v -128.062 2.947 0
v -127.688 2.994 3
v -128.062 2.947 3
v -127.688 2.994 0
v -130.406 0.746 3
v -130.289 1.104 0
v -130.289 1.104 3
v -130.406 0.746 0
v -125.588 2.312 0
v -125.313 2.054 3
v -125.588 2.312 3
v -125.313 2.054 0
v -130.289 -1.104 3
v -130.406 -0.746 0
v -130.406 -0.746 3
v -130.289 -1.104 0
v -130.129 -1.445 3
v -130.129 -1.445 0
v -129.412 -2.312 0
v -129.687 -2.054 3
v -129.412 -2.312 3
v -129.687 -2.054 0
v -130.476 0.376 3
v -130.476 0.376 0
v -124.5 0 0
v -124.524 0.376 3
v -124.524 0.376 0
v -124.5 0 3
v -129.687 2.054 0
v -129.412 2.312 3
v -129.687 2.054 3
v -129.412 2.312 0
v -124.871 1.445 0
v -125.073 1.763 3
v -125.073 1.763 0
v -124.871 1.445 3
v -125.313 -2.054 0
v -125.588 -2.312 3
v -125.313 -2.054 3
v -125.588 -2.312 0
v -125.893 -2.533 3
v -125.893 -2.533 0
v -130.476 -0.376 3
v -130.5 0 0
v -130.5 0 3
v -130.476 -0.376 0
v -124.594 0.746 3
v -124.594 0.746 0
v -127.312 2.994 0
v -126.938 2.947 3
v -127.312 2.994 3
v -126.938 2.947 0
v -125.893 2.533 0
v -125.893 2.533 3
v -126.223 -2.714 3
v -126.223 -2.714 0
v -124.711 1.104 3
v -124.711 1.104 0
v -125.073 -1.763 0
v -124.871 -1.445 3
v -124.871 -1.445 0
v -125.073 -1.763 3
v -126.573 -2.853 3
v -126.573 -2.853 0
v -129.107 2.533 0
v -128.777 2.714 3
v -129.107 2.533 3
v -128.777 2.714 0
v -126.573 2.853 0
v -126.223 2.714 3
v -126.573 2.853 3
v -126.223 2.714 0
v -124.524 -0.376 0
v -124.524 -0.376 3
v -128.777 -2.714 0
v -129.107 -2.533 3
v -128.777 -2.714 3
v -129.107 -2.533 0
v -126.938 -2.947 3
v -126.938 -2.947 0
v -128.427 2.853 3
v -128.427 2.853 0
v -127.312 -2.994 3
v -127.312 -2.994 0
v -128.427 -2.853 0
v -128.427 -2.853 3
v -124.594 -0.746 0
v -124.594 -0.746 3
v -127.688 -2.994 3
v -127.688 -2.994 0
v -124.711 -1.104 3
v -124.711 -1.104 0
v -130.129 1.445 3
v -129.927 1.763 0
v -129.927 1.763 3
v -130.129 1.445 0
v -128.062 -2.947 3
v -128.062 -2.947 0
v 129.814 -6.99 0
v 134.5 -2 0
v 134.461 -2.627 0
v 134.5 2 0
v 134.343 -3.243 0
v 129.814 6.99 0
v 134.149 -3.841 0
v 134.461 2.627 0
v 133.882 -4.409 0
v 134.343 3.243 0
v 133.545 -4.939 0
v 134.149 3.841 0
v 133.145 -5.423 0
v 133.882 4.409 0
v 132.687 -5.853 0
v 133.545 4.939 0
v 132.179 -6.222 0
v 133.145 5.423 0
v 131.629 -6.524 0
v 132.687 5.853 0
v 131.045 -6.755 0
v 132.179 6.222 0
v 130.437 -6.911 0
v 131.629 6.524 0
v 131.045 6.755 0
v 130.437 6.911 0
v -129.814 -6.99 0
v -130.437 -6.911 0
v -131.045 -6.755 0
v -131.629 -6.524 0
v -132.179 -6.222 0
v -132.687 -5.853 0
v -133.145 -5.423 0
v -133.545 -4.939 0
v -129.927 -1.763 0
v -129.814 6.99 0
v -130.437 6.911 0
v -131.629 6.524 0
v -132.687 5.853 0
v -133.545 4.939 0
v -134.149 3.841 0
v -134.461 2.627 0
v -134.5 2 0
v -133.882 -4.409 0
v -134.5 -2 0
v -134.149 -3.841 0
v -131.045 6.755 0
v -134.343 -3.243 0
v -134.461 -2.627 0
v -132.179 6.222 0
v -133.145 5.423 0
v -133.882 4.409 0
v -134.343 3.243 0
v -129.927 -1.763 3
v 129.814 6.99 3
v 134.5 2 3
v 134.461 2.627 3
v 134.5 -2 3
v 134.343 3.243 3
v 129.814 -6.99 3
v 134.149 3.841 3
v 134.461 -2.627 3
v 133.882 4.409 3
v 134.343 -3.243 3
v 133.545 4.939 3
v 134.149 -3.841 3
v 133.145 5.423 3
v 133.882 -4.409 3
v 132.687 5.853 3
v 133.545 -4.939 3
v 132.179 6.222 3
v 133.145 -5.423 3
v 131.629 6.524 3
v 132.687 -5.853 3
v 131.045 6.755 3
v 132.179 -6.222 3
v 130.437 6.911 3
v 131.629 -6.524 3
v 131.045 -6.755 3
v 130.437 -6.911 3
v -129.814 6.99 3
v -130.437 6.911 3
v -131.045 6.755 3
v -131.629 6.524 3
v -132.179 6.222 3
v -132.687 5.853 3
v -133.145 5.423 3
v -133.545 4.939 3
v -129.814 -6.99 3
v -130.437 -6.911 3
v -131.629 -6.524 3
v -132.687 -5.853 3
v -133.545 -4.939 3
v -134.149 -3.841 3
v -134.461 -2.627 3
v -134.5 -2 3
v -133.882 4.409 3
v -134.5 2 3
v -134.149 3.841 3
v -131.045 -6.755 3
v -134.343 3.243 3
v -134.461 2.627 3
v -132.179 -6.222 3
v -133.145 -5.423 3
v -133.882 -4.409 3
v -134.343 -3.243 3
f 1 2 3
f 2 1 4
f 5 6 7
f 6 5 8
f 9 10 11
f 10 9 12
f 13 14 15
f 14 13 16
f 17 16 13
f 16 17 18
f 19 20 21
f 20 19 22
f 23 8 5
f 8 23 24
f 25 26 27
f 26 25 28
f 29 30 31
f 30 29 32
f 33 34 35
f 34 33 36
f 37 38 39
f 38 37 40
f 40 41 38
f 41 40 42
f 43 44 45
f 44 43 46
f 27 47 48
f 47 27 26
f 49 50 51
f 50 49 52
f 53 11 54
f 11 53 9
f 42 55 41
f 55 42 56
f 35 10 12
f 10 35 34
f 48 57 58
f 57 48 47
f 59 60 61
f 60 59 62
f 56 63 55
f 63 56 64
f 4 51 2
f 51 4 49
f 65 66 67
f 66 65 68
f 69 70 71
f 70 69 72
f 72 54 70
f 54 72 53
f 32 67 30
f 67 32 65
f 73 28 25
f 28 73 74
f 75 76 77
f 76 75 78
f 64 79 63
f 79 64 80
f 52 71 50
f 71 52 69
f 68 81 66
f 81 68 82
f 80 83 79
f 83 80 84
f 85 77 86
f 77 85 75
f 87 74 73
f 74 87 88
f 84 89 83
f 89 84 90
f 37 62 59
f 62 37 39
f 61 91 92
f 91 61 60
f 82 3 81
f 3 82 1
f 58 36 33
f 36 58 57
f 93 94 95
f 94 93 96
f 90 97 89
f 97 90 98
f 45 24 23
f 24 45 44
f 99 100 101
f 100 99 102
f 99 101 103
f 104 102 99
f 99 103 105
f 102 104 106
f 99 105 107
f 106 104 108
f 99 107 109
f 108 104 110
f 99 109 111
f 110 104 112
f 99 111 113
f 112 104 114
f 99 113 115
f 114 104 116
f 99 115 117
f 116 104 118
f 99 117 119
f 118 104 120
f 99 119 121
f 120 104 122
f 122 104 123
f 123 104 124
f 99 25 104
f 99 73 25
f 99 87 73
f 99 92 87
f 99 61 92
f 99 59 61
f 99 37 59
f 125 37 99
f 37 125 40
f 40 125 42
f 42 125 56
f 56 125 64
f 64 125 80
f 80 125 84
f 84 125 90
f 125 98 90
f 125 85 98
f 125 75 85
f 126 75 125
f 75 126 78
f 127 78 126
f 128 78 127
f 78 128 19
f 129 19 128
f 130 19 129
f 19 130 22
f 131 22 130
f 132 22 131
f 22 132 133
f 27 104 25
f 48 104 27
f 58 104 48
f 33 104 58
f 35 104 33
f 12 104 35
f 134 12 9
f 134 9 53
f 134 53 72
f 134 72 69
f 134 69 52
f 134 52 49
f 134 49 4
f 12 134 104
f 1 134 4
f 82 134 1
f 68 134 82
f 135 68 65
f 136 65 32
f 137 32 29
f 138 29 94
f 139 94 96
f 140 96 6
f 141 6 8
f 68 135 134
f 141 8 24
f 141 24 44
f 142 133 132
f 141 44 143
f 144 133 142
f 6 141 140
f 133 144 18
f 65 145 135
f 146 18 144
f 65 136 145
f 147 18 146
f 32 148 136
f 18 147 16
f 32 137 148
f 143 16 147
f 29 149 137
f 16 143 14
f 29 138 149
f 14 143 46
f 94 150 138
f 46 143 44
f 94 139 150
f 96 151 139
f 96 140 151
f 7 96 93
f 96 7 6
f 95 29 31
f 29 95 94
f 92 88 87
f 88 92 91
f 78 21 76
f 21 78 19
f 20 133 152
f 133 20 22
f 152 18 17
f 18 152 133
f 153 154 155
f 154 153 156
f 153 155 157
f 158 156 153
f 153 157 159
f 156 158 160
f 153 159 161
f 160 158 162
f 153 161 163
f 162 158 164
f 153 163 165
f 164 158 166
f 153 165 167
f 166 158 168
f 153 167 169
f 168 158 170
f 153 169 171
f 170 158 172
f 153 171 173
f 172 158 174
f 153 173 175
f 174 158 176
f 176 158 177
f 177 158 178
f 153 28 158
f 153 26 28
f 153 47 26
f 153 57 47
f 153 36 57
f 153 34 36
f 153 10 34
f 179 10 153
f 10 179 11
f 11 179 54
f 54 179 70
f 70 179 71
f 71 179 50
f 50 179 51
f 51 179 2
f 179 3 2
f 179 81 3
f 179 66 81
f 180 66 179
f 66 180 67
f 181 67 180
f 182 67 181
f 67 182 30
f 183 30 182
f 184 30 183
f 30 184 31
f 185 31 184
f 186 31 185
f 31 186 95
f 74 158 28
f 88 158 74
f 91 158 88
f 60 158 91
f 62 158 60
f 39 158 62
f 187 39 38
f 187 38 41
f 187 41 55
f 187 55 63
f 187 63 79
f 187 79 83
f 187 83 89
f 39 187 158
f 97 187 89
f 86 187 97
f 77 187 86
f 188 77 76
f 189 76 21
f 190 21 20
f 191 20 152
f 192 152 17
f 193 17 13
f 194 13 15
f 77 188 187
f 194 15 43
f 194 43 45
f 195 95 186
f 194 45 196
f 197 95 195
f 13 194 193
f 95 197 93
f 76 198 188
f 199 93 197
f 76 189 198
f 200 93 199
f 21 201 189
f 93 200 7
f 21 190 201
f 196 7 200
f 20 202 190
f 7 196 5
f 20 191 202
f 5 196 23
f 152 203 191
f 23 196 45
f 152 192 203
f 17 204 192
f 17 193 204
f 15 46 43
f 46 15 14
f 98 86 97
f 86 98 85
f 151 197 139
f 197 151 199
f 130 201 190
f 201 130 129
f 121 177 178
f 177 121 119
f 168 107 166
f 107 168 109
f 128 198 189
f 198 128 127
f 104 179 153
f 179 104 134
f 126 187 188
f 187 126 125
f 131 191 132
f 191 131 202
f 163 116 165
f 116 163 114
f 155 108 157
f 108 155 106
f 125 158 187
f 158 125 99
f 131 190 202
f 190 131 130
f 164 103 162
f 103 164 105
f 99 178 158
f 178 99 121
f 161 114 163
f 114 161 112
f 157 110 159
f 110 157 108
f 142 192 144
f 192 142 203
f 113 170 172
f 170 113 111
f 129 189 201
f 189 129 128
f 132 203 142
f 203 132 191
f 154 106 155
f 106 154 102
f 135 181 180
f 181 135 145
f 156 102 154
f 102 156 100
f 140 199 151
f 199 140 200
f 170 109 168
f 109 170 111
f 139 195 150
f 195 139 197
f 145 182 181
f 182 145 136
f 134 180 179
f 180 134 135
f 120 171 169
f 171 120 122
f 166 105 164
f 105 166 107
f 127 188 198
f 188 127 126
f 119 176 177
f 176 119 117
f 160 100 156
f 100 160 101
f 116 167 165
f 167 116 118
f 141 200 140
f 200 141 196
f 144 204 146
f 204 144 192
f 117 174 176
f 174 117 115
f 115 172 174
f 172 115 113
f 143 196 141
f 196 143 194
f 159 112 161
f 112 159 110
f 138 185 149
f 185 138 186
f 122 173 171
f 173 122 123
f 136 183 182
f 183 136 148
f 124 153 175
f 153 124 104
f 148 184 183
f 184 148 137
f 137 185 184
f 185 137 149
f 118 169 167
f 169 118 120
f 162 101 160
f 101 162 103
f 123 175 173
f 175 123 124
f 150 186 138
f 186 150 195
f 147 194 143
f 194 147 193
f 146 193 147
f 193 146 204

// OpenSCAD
$fn = 50;


difference() {
	union() {
		hull() {
			translate(v = [-129.5000000000, 2.0000000000, 0]) {
				cylinder(h = 3, r = 5);
			}
			translate(v = [129.5000000000, 2.0000000000, 0]) {
				cylinder(h = 3, r = 5);
			}
			translate(v = [-129.5000000000, -2.0000000000, 0]) {
				cylinder(h = 3, r = 5);
			}
			translate(v = [129.5000000000, -2.0000000000, 0]) {
				cylinder(h = 3, r = 5);
			}
		}
	}
	union() {
		translate(v = [-127.5000000000, 0.0000000000, 0]) {
			cylinder(h = 3, r = 3.0000000000);
		}
		translate(v = [-127.5000000000, 0.0000000000, 0]) {
			cylinder(h = 3, r = 1.5000000000);
		}
		translate(v = [-127.5000000000, 0.0000000000, 0]) {
			cylinder(h = 3, r = 1.5000000000);
		}
		translate(v = [-127.5000000000, 0.0000000000, 0]) {
			cylinder(h = 3, r = 1.5000000000);
		}
	}
}
